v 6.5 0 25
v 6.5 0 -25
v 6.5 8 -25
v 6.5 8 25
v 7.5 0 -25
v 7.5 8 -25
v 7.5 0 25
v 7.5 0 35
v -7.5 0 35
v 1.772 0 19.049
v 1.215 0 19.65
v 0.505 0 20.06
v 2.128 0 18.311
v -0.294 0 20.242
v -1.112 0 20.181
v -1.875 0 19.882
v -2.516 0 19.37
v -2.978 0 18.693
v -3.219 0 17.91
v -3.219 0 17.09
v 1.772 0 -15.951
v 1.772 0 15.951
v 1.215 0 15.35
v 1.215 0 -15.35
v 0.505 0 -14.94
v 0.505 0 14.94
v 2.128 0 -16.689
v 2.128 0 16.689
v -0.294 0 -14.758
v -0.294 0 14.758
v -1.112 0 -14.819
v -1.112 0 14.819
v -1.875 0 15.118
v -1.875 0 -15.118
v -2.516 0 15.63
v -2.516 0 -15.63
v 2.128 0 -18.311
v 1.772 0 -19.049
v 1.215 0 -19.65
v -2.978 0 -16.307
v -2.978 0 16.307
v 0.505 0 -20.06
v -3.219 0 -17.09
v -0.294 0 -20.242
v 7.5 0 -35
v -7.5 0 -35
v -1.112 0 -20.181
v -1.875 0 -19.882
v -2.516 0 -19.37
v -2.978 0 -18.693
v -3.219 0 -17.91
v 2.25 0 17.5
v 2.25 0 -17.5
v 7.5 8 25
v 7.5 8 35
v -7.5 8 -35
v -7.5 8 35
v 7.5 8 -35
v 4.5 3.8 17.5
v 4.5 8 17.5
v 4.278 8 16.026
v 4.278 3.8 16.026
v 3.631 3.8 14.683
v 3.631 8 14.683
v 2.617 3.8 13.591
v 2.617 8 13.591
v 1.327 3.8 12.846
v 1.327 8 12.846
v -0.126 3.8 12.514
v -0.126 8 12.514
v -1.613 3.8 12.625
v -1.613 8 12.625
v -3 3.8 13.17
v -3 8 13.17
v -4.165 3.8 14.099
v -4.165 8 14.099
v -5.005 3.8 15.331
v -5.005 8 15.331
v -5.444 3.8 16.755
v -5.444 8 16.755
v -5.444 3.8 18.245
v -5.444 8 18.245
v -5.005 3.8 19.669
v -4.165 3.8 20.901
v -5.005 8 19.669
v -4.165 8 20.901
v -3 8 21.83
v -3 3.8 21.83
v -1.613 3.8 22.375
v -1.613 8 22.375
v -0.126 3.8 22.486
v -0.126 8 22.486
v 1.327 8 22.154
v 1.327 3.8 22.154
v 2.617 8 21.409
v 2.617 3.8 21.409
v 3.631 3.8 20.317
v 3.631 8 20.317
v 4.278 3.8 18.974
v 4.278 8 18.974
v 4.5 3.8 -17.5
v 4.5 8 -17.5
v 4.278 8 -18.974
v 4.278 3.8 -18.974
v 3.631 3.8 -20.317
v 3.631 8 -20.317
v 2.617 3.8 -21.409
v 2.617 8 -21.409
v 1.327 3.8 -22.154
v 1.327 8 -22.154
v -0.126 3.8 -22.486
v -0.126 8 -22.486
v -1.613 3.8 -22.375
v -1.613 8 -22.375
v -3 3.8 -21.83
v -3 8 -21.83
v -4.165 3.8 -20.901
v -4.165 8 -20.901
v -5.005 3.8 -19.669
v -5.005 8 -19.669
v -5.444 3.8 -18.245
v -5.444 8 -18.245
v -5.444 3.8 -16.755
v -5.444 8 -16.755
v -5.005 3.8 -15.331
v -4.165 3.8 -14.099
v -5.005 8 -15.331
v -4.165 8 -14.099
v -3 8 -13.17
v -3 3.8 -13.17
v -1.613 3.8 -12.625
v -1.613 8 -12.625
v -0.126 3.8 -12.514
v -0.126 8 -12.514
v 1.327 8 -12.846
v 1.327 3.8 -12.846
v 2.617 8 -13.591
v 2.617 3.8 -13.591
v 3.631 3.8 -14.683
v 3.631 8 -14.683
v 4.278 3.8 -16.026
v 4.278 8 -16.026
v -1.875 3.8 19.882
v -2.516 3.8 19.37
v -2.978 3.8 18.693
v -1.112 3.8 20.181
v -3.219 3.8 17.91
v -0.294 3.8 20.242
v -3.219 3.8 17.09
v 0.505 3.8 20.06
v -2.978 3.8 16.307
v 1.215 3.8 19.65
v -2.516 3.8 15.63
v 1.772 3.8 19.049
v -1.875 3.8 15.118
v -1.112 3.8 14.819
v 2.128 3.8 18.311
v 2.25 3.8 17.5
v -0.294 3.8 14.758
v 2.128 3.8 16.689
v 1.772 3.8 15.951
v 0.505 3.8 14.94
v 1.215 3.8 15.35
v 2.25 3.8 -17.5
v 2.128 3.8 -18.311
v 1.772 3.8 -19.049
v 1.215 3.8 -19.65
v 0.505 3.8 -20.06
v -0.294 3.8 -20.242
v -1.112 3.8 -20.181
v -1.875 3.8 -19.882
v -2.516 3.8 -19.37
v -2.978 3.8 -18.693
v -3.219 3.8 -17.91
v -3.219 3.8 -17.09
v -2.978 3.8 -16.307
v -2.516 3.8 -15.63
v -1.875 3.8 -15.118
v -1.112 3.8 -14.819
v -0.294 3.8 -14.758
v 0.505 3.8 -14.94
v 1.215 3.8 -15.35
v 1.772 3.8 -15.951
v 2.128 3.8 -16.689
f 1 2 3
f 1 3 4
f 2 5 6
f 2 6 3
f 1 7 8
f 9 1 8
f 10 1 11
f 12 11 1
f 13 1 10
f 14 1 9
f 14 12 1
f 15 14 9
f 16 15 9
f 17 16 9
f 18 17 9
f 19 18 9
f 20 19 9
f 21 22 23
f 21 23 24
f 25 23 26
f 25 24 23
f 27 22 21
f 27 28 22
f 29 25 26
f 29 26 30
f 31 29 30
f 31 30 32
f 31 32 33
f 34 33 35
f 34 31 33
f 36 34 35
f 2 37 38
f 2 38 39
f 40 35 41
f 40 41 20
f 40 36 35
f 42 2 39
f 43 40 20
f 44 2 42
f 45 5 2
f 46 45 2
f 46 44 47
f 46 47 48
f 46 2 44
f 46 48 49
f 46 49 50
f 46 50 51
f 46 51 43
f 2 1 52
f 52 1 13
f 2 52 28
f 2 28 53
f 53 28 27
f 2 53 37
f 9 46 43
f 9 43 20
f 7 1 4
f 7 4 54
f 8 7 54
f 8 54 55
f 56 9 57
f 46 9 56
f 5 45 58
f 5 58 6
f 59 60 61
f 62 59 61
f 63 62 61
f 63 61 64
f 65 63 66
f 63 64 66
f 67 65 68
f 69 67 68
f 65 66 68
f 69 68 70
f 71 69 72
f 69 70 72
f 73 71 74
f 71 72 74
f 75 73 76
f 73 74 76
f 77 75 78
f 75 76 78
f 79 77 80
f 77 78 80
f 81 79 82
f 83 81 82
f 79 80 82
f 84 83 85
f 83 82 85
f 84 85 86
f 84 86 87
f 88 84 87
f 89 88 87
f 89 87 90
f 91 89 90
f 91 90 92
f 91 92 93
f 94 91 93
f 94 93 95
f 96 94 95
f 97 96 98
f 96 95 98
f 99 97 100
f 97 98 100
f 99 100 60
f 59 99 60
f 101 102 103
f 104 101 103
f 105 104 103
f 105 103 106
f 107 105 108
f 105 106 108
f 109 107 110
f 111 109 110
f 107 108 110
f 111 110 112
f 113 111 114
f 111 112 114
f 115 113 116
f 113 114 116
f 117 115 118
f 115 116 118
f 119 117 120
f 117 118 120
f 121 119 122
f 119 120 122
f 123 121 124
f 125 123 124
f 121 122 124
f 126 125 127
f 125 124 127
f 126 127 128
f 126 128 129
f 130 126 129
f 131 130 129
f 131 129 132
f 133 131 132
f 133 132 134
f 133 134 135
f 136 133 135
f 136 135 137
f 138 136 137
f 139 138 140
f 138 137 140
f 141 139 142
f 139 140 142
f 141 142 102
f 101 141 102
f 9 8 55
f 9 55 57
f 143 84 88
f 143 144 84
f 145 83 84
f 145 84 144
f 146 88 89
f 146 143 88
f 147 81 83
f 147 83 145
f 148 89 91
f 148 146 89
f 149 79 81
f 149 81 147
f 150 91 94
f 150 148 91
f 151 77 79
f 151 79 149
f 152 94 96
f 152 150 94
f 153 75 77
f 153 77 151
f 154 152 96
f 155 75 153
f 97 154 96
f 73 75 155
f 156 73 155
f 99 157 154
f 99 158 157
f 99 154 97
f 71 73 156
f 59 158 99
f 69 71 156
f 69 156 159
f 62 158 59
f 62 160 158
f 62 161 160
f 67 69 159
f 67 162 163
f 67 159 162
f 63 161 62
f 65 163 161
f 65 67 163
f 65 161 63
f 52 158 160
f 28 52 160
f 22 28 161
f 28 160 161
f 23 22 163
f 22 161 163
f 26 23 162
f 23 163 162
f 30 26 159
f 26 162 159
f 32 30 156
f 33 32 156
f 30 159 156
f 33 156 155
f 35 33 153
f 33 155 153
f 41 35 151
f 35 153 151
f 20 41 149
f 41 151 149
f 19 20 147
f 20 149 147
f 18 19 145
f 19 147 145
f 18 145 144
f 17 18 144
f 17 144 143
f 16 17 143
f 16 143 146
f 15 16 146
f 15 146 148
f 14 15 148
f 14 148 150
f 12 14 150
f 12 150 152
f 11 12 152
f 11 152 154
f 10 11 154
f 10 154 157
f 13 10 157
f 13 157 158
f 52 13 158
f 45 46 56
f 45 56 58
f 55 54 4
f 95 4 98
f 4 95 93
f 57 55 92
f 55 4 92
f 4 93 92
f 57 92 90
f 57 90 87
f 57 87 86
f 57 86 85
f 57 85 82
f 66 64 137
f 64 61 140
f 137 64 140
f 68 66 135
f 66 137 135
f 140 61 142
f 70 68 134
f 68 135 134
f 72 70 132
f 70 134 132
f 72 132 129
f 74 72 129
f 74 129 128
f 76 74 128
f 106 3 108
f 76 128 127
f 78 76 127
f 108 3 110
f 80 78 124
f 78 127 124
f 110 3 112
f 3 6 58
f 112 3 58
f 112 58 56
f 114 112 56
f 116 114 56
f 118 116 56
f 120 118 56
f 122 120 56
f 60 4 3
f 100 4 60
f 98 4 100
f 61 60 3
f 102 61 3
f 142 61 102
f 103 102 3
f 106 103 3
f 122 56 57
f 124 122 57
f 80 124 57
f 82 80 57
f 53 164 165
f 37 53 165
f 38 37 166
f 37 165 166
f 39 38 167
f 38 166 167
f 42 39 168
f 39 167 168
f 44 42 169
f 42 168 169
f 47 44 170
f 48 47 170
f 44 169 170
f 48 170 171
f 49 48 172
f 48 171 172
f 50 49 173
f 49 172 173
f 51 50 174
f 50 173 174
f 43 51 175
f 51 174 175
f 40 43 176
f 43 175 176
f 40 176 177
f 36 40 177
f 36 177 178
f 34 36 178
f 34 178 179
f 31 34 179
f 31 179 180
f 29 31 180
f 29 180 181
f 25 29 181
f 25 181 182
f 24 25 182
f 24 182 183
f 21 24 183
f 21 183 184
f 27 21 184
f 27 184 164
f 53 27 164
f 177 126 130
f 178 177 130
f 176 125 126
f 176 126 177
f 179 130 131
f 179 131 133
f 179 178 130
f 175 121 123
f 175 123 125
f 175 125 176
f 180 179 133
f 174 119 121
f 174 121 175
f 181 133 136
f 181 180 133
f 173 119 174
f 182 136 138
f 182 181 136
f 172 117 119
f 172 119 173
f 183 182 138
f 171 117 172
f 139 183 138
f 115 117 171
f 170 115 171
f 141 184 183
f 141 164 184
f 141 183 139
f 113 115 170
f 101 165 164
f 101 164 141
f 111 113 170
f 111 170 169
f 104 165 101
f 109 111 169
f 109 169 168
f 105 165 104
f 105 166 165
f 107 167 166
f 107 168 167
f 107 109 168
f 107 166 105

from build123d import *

# Parameters (mm, degrees)
BOSS_EXTRUDE1_DEPTH = 8
SKETCH2_R           = 2.75
CUT_EXTRUDE1_DEPTH  = 9
SKETCH3_R           = 5
CUT_EXTRUDE2_DEPTH  = 4.2


with BuildPart() as part:
    # Sketch1 → Boss-Extrude1 (new body)
    with BuildSketch(Plane(origin=(0, 0, 0), x_dir=(1, 0, 0), z_dir=(0, 1, 0))):
        Polygon((7.5, 25), (6.5, 25), (6.5, -25), (7.5, -25), (7.5, -35), (-7.5, -35), (-7.5, 35), (7.5, 35), align=None)
    extrude(amount=BOSS_EXTRUDE1_DEPTH)

    # Sketch2 → Cut-Extrude1 (cut, through all)
    with BuildSketch(Plane(origin=(0, 8, 0), x_dir=(1, 0, 0), z_dir=(0, 1, 0))):
        with Locations((-0.5, 17.5)):
            Circle(SKETCH2_R)
        with Locations((-0.5, -17.5)):
            Circle(SKETCH2_R)
    extrude(amount=-CUT_EXTRUDE1_DEPTH, mode=Mode.SUBTRACT)

    # Sketch3 → Cut-Extrude2 (cut)
    with BuildSketch(Plane(origin=(0, 8, 0), x_dir=(1, 0, 0), z_dir=(0, 1, 0))):
        with Locations((-0.5, 17.5)):
            Circle(SKETCH3_R)
        with Locations((-0.5, -17.5)):
            Circle(SKETCH3_R)
    extrude(amount=-CUT_EXTRUDE2_DEPTH, mode=Mode.SUBTRACT)


solid = part.part
